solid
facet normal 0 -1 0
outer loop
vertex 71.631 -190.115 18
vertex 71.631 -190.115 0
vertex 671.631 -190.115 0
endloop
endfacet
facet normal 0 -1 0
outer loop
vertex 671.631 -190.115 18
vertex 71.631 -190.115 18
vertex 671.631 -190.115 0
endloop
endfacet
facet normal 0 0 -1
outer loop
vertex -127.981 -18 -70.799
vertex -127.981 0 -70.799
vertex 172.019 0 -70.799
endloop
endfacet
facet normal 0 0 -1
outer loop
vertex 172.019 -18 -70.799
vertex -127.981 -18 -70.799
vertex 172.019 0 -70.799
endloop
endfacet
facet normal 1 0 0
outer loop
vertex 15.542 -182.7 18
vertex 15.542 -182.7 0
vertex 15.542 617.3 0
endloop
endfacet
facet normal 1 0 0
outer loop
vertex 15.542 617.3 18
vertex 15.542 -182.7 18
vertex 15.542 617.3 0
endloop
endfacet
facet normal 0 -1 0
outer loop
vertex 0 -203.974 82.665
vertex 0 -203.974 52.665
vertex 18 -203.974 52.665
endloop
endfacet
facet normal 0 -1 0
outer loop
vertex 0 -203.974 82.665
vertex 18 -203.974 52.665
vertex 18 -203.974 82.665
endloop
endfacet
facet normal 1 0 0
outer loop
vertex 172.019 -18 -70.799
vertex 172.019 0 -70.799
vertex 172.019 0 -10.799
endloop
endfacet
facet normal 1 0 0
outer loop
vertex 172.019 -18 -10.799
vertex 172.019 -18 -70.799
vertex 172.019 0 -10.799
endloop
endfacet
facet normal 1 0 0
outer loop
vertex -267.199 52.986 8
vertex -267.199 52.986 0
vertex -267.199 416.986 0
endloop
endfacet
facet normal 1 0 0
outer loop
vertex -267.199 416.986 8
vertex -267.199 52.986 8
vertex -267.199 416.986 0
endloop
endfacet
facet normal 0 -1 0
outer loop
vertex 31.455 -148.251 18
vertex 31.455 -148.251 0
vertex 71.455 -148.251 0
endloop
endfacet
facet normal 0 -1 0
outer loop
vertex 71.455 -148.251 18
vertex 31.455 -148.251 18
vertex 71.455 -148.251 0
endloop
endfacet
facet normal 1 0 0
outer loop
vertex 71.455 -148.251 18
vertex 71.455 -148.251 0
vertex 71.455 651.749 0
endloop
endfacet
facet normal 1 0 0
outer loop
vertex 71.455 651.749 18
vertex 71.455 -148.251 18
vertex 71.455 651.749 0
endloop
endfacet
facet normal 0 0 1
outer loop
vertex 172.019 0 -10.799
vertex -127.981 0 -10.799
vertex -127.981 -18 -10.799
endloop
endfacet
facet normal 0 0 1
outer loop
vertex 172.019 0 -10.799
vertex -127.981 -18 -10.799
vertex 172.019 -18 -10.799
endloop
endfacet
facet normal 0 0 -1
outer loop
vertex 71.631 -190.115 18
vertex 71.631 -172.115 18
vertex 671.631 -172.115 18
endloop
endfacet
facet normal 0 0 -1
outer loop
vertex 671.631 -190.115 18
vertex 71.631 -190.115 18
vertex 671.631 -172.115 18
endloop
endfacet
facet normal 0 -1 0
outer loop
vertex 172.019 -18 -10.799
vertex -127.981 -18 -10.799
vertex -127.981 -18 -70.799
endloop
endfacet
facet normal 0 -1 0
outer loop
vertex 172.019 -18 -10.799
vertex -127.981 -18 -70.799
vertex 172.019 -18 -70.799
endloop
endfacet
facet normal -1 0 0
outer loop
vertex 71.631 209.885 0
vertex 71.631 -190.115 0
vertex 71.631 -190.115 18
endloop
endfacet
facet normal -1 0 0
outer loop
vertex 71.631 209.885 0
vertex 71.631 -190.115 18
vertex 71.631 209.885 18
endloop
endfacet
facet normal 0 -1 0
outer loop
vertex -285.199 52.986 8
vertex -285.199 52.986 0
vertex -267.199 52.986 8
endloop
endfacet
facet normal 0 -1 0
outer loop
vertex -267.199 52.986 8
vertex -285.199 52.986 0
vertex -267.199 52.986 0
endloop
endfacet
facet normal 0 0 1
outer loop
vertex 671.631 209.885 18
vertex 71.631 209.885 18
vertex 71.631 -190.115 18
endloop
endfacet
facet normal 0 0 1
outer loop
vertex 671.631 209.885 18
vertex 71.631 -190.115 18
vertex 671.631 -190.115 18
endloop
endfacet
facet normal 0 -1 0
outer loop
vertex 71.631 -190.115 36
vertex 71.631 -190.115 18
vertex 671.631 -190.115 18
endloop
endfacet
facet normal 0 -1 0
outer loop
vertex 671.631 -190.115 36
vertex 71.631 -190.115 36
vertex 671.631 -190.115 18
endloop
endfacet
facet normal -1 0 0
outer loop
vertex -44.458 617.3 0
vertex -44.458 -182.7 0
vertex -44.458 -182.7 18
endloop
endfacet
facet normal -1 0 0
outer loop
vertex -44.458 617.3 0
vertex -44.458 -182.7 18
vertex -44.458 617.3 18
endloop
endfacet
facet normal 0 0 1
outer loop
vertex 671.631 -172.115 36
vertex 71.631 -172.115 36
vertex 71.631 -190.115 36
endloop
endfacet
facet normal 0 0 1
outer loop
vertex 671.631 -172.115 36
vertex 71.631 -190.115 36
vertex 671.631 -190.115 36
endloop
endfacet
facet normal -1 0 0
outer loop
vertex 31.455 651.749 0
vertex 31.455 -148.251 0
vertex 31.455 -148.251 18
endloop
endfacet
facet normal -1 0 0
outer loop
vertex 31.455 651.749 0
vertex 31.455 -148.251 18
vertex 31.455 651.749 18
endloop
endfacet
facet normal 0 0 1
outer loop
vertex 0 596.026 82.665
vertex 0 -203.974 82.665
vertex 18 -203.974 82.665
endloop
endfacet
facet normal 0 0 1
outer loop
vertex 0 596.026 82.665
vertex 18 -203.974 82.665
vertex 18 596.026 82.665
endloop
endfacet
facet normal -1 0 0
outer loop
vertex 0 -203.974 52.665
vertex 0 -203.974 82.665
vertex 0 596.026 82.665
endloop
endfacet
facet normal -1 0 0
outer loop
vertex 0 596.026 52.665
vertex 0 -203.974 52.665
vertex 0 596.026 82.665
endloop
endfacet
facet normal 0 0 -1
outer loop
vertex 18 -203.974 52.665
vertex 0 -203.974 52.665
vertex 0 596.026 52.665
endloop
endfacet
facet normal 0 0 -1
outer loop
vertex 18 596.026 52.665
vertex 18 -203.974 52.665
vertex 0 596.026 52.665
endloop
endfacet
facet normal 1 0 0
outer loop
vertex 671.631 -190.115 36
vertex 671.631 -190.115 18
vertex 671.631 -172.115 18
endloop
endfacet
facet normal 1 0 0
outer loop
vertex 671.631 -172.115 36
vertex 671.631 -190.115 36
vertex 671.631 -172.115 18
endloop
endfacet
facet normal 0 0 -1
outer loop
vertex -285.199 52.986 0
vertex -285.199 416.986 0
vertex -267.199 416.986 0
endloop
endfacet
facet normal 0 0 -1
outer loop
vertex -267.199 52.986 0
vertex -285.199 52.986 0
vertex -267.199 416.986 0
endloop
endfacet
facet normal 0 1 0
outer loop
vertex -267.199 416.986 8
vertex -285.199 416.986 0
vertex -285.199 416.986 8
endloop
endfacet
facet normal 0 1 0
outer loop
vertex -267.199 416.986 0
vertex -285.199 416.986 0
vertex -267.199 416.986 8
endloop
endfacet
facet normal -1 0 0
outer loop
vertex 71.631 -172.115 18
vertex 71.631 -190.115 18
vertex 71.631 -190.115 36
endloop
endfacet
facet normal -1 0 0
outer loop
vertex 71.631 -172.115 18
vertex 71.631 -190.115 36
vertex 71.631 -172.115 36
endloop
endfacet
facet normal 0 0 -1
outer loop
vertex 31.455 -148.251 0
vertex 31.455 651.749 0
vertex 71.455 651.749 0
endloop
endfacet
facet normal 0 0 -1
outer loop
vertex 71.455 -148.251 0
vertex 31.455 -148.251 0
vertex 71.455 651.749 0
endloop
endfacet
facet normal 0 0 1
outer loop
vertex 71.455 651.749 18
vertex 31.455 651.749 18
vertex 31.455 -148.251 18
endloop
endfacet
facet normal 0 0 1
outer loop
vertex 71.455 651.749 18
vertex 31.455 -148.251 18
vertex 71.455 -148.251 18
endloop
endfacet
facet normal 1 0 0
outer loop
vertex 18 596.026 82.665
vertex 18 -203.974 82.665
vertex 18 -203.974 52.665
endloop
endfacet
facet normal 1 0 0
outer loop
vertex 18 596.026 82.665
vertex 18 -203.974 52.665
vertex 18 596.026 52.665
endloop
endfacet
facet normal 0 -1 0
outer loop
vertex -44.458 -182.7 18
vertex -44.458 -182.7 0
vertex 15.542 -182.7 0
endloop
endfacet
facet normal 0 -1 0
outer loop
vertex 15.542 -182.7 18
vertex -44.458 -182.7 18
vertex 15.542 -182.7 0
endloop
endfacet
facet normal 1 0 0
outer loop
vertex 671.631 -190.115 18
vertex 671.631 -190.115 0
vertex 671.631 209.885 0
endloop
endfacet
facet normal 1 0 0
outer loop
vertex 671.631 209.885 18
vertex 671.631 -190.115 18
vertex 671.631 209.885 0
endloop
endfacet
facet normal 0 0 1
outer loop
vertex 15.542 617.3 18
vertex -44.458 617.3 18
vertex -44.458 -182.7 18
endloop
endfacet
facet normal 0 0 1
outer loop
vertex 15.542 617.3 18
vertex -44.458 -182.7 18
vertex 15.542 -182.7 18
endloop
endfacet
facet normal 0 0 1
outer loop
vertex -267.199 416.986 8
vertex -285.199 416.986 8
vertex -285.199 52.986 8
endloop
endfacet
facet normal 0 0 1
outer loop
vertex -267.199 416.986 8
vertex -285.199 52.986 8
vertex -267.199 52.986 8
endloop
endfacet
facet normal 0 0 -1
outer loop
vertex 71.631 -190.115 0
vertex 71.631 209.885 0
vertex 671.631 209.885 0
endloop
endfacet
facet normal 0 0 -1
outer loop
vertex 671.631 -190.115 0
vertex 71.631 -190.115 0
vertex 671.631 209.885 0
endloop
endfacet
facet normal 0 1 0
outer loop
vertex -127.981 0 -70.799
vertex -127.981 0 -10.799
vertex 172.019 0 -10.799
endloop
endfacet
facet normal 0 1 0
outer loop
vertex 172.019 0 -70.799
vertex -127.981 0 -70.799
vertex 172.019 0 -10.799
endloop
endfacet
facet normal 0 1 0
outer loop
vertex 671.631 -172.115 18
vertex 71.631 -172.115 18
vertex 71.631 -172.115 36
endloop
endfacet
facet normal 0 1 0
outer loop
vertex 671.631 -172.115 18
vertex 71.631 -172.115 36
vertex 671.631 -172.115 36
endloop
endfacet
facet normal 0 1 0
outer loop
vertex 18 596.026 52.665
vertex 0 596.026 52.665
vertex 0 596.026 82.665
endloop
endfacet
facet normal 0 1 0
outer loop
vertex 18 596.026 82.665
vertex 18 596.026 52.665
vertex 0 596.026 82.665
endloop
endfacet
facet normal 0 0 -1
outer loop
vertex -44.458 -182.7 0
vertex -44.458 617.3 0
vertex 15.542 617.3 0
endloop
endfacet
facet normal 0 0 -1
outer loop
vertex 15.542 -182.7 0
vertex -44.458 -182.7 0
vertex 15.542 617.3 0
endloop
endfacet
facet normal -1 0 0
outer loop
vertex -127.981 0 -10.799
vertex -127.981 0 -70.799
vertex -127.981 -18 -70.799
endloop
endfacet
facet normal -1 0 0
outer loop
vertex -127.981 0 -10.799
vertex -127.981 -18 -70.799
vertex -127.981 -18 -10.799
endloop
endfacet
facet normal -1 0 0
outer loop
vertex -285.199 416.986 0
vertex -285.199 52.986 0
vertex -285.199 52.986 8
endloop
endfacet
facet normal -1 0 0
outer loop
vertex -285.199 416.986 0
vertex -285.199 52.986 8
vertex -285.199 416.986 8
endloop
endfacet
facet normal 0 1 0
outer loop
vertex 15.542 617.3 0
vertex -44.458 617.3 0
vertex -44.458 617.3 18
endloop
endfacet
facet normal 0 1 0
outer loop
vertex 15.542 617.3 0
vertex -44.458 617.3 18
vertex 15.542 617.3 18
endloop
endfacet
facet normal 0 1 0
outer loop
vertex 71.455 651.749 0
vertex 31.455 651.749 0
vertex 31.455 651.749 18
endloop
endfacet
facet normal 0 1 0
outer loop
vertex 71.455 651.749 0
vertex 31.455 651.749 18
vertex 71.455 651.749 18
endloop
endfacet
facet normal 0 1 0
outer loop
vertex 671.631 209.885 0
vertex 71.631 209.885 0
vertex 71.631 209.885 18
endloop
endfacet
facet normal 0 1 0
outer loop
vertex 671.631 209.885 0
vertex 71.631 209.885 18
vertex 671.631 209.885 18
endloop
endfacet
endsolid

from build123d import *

# Parameters (mm, degrees)
F0_W      = 60
F0_H      = 800
F1_DEPTH  = 18
F2_W      = 40
F2_H      = 800
F3_DEPTH  = 18
F4_W      = 800
F4_H      = 30
F5_DEPTH  = 18
F6_W      = 300
F6_H      = 60
F7_DEPTH  = 18
F8_W      = 600
F8_H      = 400
F9_DEPTH  = 18
F10_W     = 600
F10_H     = 18
F11_DEPTH = 18
F12_W     = 18
F12_H     = 364
F13_DEPTH = 8


with BuildPart() as f1:
    # F0 (on Top) → F1 (new body)
    with BuildSketch(Plane.XY):
        with Locations((-14.458162, 217.299924)):
            Rectangle(F0_W, F0_H)
    extrude(amount=F1_DEPTH)


with BuildPart() as f3:
    # F2 (on Top) → F3 (new body)
    with BuildSketch(Plane.XY):
        with Locations((51.454826, 251.748741)):
            Rectangle(F2_W, F2_H)
    extrude(amount=F3_DEPTH)


with BuildPart() as f5:
    # F4 (on Right) → F5 (new body)
    with BuildSketch(Plane.YZ):
        with Locations((196.025786, 67.664795)):
            Rectangle(F4_W, F4_H)
    extrude(amount=F5_DEPTH)


with BuildPart() as f7:
    # F6 (on Front) → F7 (new body)
    with BuildSketch(Plane.XZ):
        with Locations((22.019405, -40.799229)):
            Rectangle(F6_W, F6_H)
    extrude(amount=F7_DEPTH)


with BuildPart() as f9:
    # F8 (on Top) → F9 (new body)
    with BuildSketch(Plane.XY):
        with Locations((371.630521, 9.885475)):
            Rectangle(F8_W, F8_H)
    extrude(amount=F9_DEPTH)


with BuildPart() as f11:
    # F10 (on face) → F11 (new body)
    with BuildSketch(Plane.XY.offset(18)):
        with Locations((371.630521, -181.114525)):
            Rectangle(F10_W, F10_H)
    extrude(amount=F11_DEPTH)


with BuildPart() as f13:
    # F12 (on Top) → F13 (new body)
    with BuildSketch(Plane.XY):
        with Locations((-276.199482, 234.986461)):
            Rectangle(F12_W, F12_H)
    extrude(amount=F13_DEPTH)


solid = Compound([f1.part, f3.part, f5.part, f7.part, f9.part, f11.part, f13.part])
